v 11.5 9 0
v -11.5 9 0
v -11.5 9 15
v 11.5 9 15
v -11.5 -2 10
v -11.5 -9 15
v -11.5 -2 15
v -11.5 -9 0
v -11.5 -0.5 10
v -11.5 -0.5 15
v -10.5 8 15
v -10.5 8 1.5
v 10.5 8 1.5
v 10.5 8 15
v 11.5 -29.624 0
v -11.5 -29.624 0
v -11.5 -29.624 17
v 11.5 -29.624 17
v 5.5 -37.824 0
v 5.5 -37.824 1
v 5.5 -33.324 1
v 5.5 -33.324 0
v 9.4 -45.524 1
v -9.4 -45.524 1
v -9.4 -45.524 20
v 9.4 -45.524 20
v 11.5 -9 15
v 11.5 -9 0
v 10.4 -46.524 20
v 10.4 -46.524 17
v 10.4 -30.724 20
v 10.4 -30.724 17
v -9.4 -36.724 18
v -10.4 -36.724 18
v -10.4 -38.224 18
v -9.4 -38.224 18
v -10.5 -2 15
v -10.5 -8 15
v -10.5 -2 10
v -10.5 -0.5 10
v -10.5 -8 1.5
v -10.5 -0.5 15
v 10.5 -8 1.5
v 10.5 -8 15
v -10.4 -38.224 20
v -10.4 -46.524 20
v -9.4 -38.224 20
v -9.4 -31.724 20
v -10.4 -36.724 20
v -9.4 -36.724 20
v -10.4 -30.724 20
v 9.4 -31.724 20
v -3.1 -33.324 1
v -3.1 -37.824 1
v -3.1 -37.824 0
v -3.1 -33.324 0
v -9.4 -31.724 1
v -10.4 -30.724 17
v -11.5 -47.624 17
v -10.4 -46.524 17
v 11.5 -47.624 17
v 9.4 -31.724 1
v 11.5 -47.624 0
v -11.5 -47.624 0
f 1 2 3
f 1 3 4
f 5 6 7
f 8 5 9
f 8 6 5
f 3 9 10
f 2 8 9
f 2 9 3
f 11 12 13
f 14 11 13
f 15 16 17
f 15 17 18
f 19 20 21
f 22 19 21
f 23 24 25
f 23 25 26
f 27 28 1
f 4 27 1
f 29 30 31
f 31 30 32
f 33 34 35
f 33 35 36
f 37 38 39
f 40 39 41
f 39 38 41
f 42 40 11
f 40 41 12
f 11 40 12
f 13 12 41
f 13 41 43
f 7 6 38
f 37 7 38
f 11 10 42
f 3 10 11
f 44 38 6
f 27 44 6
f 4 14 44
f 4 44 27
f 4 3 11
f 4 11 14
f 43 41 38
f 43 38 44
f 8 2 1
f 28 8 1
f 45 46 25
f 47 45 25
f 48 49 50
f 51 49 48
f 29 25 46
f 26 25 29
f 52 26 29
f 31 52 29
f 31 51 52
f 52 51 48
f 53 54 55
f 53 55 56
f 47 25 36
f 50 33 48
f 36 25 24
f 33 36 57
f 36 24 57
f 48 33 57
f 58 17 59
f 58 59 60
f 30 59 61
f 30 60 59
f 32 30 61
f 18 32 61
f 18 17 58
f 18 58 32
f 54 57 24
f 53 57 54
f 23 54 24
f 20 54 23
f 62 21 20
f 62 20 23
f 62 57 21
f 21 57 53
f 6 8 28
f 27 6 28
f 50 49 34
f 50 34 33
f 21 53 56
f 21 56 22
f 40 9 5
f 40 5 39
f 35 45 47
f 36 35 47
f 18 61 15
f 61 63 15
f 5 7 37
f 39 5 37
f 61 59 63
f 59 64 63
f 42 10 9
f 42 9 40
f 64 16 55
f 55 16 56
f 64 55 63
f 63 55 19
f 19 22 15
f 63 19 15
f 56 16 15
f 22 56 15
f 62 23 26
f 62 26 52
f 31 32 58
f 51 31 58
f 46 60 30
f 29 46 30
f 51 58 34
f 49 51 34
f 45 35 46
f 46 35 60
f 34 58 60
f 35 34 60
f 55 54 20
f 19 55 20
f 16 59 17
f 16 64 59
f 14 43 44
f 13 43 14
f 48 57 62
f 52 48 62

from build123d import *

# Parameters (mm, degrees)
F0_W        = 21
F0_H        = 16
F1_DEPTH    = 1.5
F0_W_2      = 23
F0_H_2      = 18
F2_DEPTH    = 15
F3_W        = 1
F3_H        = 1.5
F4_DEPTH    = 5
F5_W        = 18.8
F5_H        = 13.8
F6_DEPTH    = 1
F7_DEPTH    = 20
F8_W        = 8.6
F8_H        = 4.5
F9_DEPTH    = 4
F7_FACE_W   = 23
F7_FACE_H   = 18
F7_FACE_W_2 = 20.8
F7_FACE_H_2 = 15.8
F10_DEPTH   = 16
F11_W       = 1
F11_H       = 1.5
F12_DEPTH   = 2


with BuildPart() as f1:
    # F0 (on Top) → F1 (new body)
    with BuildSketch(Plane.XY):
        Rectangle(F0_W, F0_H)
    extrude(amount=F1_DEPTH)

    # F0 (on Top) → F2 (join)
    with BuildSketch(Plane.XY):
        Rectangle(F0_W_2, F0_H_2)
        Rectangle(F0_W, F0_H, mode=Mode.SUBTRACT)
    extrude(amount=F2_DEPTH)

    # F3 (on face) → F4 (cut)
    with BuildSketch(Plane.XY.offset(15)):
        with Locations((-11, -1.25)):
            Rectangle(F3_W, F3_H)
    extrude(amount=-F4_DEPTH, mode=Mode.SUBTRACT)


with BuildPart() as f6:
    # F5 (on Top) → F6 (new body)
    with BuildSketch(Plane.XY):
        Polygon((-11.5, -47.624052), (11.5, -47.624052), (11.5, -29.624052), (-11.5, -29.624052), (-11.5, -32.324052), (-11.5, -45.924052), align=None)
        Polygon((10.4, -46.524052), (-10.4, -46.524052), (-10.4, -45.924052), (-10.4, -32.324052), (-10.4, -30.724052), (10.4, -30.724052), align=None, mode=Mode.SUBTRACT)
        Polygon((-10.4, -45.924052), (-10.4, -46.524052), (10.4, -46.524052), (10.4, -30.724052), (-10.4, -30.724052), (-10.4, -32.324052), align=None)
        with Locations((0, -38.624052)):
            Rectangle(F5_W, F5_H, mode=Mode.SUBTRACT)
        with Locations((0, -38.624052)):
            Rectangle(F5_W, F5_H)
    extrude(amount=F6_DEPTH)

    # F5 (on Top) → F7 (join)
    with BuildSketch(Plane.XY):
        Polygon((-10.4, -45.924052), (-10.4, -46.524052), (10.4, -46.524052), (10.4, -30.724052), (-10.4, -30.724052), (-10.4, -32.324052), align=None)
        with Locations((0, -38.624052)):
            Rectangle(F5_W, F5_H, mode=Mode.SUBTRACT)
    extrude(amount=F7_DEPTH)

    # F8 (on face) → F9 (cut)
    with BuildSketch(Plane.XY.offset(1)):
        with Locations((1.2, -35.574052)):
            Rectangle(F8_W, F8_H)
    extrude(amount=-F9_DEPTH, mode=Mode.SUBTRACT)

    # F7_face (on face) → F10 (join)
    with BuildSketch(Plane(origin=(0, -38.624052, 1), x_dir=(1, 0, 0), z_dir=(0, 0, 1))):
        Rectangle(F7_FACE_W, F7_FACE_H)
        Rectangle(F7_FACE_W_2, F7_FACE_H_2, mode=Mode.SUBTRACT)
    extrude(amount=F10_DEPTH)

    # F11 (on face) → F12 (cut)
    with BuildSketch(Plane.XY.offset(20)):
        with Locations((-9.9, -37.474052)):
            Rectangle(F11_W, F11_H)
    extrude(amount=-F12_DEPTH, mode=Mode.SUBTRACT)


solid = Compound([f1.part, f6.part])
